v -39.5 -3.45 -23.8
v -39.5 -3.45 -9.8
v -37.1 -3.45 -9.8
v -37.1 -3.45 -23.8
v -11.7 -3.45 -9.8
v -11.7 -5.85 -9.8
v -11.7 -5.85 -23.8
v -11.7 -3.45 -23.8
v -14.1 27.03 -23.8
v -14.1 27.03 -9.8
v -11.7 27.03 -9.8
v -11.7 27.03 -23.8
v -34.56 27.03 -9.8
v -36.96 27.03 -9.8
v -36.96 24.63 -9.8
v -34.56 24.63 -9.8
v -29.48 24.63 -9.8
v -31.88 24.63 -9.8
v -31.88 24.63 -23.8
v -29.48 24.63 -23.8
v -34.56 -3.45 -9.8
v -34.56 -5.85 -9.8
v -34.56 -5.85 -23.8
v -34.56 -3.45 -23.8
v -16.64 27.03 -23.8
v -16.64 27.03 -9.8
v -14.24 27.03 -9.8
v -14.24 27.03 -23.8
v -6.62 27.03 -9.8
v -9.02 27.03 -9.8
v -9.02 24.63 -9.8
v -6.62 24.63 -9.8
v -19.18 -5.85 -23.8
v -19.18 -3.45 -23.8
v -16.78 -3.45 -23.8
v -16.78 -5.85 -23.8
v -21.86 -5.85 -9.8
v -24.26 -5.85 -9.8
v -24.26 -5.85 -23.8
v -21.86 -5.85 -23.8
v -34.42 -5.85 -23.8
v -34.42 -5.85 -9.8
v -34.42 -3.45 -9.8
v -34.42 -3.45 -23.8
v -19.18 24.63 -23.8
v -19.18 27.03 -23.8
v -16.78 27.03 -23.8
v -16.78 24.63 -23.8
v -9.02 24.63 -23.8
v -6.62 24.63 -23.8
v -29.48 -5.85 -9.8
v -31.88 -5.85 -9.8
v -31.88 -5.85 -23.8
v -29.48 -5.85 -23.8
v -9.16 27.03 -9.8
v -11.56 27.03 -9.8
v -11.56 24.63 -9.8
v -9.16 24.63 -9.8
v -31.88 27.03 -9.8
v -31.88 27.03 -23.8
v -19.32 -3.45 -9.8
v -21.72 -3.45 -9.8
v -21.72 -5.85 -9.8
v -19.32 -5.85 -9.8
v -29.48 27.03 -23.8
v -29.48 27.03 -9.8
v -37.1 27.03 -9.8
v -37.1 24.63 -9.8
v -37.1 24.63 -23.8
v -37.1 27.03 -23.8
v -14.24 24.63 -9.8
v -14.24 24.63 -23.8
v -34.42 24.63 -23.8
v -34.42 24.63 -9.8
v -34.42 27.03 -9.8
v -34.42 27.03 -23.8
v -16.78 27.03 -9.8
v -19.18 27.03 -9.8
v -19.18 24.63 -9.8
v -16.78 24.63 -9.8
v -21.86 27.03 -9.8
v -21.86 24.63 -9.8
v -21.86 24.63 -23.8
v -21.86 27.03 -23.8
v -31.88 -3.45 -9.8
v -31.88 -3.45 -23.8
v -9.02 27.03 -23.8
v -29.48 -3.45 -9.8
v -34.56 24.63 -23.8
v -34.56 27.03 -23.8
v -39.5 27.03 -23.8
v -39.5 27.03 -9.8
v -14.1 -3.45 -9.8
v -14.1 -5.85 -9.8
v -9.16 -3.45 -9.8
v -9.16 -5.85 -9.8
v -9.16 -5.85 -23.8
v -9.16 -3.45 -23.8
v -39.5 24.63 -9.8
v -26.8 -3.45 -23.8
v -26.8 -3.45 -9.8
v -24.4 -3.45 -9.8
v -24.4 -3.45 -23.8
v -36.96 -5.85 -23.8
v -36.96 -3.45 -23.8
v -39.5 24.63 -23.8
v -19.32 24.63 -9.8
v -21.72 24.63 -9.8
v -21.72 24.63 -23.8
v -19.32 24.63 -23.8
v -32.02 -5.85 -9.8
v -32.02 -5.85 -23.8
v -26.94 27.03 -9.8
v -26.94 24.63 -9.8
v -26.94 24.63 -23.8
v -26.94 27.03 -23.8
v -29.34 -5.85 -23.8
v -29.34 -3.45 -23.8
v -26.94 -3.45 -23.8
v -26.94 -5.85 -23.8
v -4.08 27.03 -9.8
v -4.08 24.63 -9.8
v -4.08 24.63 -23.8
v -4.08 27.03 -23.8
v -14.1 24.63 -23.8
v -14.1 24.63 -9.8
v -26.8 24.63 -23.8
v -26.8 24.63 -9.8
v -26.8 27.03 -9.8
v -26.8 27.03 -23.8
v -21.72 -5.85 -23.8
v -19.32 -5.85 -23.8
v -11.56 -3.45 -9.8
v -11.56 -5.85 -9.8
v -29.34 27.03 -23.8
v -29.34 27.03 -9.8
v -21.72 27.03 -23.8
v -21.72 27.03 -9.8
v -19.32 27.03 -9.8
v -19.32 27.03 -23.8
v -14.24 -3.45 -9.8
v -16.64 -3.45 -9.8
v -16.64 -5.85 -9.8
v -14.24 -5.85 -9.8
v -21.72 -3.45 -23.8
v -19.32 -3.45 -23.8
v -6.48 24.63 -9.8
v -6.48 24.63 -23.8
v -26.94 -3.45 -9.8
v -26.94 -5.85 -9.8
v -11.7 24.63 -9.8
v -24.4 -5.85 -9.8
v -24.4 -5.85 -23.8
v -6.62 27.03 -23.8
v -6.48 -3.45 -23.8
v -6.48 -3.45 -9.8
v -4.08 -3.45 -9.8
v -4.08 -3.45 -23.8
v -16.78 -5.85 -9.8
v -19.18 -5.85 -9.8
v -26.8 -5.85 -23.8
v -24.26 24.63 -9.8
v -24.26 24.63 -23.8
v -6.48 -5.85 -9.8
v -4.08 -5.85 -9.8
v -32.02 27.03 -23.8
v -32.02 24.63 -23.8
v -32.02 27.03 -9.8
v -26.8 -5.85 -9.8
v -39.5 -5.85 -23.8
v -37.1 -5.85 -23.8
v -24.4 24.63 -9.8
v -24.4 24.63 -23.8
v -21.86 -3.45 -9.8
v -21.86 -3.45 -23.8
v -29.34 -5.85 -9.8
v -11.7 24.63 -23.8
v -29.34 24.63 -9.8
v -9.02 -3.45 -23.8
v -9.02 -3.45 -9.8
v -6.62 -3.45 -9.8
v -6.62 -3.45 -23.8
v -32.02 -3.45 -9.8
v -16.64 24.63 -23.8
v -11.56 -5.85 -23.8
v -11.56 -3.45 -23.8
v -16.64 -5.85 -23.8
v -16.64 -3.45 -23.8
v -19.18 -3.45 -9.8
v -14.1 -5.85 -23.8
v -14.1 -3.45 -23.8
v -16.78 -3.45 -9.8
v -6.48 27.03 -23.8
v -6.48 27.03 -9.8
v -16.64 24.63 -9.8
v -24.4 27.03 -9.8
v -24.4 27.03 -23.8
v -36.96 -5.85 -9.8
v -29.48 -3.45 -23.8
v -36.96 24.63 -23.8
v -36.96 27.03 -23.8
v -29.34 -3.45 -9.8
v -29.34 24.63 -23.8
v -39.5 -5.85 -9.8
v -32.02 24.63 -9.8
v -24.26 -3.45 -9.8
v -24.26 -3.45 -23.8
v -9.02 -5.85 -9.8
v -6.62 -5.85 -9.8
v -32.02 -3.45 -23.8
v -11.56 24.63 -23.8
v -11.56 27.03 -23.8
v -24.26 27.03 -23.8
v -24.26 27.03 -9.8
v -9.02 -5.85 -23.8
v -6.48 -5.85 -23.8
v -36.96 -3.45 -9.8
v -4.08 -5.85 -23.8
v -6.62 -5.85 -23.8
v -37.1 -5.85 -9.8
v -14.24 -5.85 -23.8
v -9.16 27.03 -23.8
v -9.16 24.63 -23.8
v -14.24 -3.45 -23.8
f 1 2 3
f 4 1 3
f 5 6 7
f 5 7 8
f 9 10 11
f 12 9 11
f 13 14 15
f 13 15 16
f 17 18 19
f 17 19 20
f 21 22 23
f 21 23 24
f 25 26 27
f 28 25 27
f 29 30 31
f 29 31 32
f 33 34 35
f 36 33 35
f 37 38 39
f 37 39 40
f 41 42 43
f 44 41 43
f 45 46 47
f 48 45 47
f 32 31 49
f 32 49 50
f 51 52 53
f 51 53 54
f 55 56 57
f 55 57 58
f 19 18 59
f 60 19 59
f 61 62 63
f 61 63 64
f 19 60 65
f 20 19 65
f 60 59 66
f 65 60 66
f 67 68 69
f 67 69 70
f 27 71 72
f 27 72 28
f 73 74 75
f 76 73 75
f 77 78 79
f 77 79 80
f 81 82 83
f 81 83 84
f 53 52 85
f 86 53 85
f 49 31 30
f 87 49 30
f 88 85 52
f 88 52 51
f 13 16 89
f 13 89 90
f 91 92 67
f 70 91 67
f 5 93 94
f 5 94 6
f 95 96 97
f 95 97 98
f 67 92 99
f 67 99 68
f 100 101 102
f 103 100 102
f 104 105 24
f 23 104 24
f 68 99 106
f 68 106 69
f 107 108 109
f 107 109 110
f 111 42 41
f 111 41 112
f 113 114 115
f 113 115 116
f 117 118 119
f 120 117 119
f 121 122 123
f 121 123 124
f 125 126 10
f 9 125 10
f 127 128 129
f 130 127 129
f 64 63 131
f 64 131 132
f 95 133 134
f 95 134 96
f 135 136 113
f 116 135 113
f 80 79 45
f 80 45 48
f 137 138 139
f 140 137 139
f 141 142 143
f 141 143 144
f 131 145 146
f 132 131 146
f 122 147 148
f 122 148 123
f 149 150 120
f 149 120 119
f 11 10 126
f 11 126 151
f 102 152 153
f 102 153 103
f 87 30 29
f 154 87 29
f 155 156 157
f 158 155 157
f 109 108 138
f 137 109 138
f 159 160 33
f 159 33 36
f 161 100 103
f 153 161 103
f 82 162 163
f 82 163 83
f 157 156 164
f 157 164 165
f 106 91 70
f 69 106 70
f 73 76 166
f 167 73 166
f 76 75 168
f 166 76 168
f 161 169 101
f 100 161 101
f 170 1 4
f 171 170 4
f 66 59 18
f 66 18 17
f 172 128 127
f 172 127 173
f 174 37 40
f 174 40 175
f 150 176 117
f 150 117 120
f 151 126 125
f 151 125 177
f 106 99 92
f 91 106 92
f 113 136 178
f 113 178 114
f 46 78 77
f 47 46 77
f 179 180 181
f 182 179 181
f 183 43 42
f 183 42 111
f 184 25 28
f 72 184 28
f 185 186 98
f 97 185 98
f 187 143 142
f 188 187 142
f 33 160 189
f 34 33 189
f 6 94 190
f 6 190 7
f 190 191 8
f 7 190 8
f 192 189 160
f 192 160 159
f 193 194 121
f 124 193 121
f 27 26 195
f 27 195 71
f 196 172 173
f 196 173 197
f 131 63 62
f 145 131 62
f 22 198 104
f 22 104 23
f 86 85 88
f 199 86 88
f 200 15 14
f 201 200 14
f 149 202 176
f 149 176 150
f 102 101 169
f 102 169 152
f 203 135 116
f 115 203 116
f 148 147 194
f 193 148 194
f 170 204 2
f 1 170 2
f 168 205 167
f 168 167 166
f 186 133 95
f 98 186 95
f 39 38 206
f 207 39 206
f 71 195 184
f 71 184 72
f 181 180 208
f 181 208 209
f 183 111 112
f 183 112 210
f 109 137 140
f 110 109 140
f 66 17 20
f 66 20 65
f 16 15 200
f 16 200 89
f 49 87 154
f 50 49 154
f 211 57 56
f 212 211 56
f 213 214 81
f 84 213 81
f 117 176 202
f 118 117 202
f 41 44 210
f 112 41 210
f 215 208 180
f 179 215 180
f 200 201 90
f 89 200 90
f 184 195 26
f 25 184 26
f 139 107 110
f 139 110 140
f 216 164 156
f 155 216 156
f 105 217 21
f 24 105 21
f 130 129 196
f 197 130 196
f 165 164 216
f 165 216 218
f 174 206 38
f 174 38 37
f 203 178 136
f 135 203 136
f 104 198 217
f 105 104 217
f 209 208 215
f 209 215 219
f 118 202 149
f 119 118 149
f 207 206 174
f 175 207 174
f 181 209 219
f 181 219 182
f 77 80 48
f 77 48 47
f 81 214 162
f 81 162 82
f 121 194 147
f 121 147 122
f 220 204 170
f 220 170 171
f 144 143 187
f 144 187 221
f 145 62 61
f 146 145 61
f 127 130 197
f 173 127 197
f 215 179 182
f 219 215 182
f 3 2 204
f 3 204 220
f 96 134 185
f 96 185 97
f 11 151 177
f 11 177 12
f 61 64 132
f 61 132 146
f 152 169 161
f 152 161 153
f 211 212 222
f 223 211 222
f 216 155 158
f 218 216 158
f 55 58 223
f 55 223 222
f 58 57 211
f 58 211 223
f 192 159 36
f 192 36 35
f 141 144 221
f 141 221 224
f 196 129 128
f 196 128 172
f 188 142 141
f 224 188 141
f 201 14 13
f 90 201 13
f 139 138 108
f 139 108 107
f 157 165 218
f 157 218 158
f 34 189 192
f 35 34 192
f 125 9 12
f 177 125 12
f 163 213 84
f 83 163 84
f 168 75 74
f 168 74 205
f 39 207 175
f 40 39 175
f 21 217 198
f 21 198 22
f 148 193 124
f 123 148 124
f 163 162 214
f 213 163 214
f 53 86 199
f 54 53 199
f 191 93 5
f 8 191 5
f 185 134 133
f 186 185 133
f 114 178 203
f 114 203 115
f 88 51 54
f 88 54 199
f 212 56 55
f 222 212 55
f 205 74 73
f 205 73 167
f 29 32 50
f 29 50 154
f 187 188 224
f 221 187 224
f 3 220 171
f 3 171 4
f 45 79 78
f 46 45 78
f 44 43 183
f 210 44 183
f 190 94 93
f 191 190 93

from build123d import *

# Parameters (mm, degrees)
HOUSINGS_SK1_W    = 2.4
HOUSINGS_SK1_H    = 2.4
HOUSINGS_DEPTH    = 14
HOUSINGS_2_DEPTH  = 14
HOUSINGS_3_DEPTH  = 14
HOUSINGS_4_DEPTH  = 14
HOUSINGS_5_DEPTH  = 14
HOUSINGS_6_DEPTH  = 14
HOUSINGS_7_DEPTH  = 14
HOUSINGS_8_DEPTH  = 14
HOUSINGS_9_DEPTH  = 14
HOUSINGS_10_DEPTH = 14
HOUSINGS_11_DEPTH = 14
HOUSINGS_12_DEPTH = 14
HOUSINGS_13_DEPTH = 14
HOUSINGS_14_DEPTH = 14
HOUSINGS_15_DEPTH = 14
HOUSINGS_16_DEPTH = 14
HOUSINGS_17_DEPTH = 14
HOUSINGS_18_DEPTH = 14
HOUSINGS_19_DEPTH = 14
HOUSINGS_20_DEPTH = 14
HOUSINGS_21_DEPTH = 14
HOUSINGS_22_DEPTH = 14
HOUSINGS_23_DEPTH = 14
HOUSINGS_24_DEPTH = 14
HOUSINGS_25_DEPTH = 14
HOUSINGS_26_DEPTH = 14
HOUSINGS_27_DEPTH = 14
HOUSINGS_28_DEPTH = 14


with BuildPart() as part:
    # Housings_Sk1 → Housings (new body)
    with BuildSketch(Plane.XY.offset(-9.8)):
        with Locations((-38.3, -4.65)):
            Rectangle(HOUSINGS_SK1_W, HOUSINGS_SK1_H)
    extrude(amount=-HOUSINGS_DEPTH)


with BuildPart() as body_2:
    # Housings_Sk1 → Housings 2 (new body)
    with BuildSketch(Plane.XY.offset(-9.8)):
        with Locations((-35.76, -4.65)):
            Rectangle(HOUSINGS_SK1_W, HOUSINGS_SK1_H)
    extrude(amount=-HOUSINGS_2_DEPTH)


with BuildPart() as body_3:
    # Housings_Sk1 → Housings 3 (new body)
    with BuildSketch(Plane.XY.offset(-9.8)):
        with Locations((-33.22, -4.65)):
            Rectangle(HOUSINGS_SK1_W, HOUSINGS_SK1_H)
    extrude(amount=-HOUSINGS_3_DEPTH)


with BuildPart() as body_4:
    # Housings_Sk1 → Housings 4 (new body)
    with BuildSketch(Plane.XY.offset(-9.8)):
        with Locations((-30.68, -4.65)):
            Rectangle(HOUSINGS_SK1_W, HOUSINGS_SK1_H)
    extrude(amount=-HOUSINGS_4_DEPTH)


with BuildPart() as body_5:
    # Housings_Sk1 → Housings 5 (new body)
    with BuildSketch(Plane.XY.offset(-9.8)):
        with Locations((-28.14, -4.65)):
            Rectangle(HOUSINGS_SK1_W, HOUSINGS_SK1_H)
    extrude(amount=-HOUSINGS_5_DEPTH)


with BuildPart() as body_6:
    # Housings_Sk1 → Housings 6 (new body)
    with BuildSketch(Plane.XY.offset(-9.8)):
        with Locations((-25.6, -4.65)):
            Rectangle(HOUSINGS_SK1_W, HOUSINGS_SK1_H)
    extrude(amount=-HOUSINGS_6_DEPTH)


with BuildPart() as body_7:
    # Housings_Sk1 → Housings 7 (new body)
    with BuildSketch(Plane.XY.offset(-9.8)):
        with Locations((-23.06, -4.65)):
            Rectangle(HOUSINGS_SK1_W, HOUSINGS_SK1_H)
    extrude(amount=-HOUSINGS_7_DEPTH)


with BuildPart() as body_8:
    # Housings_Sk1 → Housings 8 (new body)
    with BuildSketch(Plane.XY.offset(-9.8)):
        with Locations((-20.52, -4.65)):
            Rectangle(HOUSINGS_SK1_W, HOUSINGS_SK1_H)
    extrude(amount=-HOUSINGS_8_DEPTH)


with BuildPart() as body_9:
    # Housings_Sk1 → Housings 9 (new body)
    with BuildSketch(Plane.XY.offset(-9.8)):
        with Locations((-17.98, -4.65)):
            Rectangle(HOUSINGS_SK1_W, HOUSINGS_SK1_H)
    extrude(amount=-HOUSINGS_9_DEPTH)


with BuildPart() as body_10:
    # Housings_Sk1 → Housings 10 (new body)
    with BuildSketch(Plane.XY.offset(-9.8)):
        with Locations((-15.44, -4.65)):
            Rectangle(HOUSINGS_SK1_W, HOUSINGS_SK1_H)
    extrude(amount=-HOUSINGS_10_DEPTH)


with BuildPart() as body_11:
    # Housings_Sk1 → Housings 11 (new body)
    with BuildSketch(Plane.XY.offset(-9.8)):
        with Locations((-12.9, -4.65)):
            Rectangle(HOUSINGS_SK1_W, HOUSINGS_SK1_H)
    extrude(amount=-HOUSINGS_11_DEPTH)


with BuildPart() as body_12:
    # Housings_Sk1 → Housings 12 (new body)
    with BuildSketch(Plane.XY.offset(-9.8)):
        with Locations((-10.36, -4.65)):
            Rectangle(HOUSINGS_SK1_W, HOUSINGS_SK1_H)
    extrude(amount=-HOUSINGS_12_DEPTH)


with BuildPart() as body_13:
    # Housings_Sk1 → Housings 13 (new body)
    with BuildSketch(Plane.XY.offset(-9.8)):
        with Locations((-7.82, -4.65)):
            Rectangle(HOUSINGS_SK1_W, HOUSINGS_SK1_H)
    extrude(amount=-HOUSINGS_13_DEPTH)


with BuildPart() as body_14:
    # Housings_Sk1 → Housings 14 (new body)
    with BuildSketch(Plane.XY.offset(-9.8)):
        with Locations((-5.28, -4.65)):
            Rectangle(HOUSINGS_SK1_W, HOUSINGS_SK1_H)
    extrude(amount=-HOUSINGS_14_DEPTH)


with BuildPart() as body_15:
    # Housings_Sk1 → Housings 15 (new body)
    with BuildSketch(Plane.XY.offset(-9.8)):
        with Locations((-38.3, 25.83)):
            Rectangle(HOUSINGS_SK1_W, HOUSINGS_SK1_H)
    extrude(amount=-HOUSINGS_15_DEPTH)


with BuildPart() as body_16:
    # Housings_Sk1 → Housings 16 (new body)
    with BuildSketch(Plane.XY.offset(-9.8)):
        with Locations((-35.76, 25.83)):
            Rectangle(HOUSINGS_SK1_W, HOUSINGS_SK1_H)
    extrude(amount=-HOUSINGS_16_DEPTH)


with BuildPart() as body_17:
    # Housings_Sk1 → Housings 17 (new body)
    with BuildSketch(Plane.XY.offset(-9.8)):
        with Locations((-33.22, 25.83)):
            Rectangle(HOUSINGS_SK1_W, HOUSINGS_SK1_H)
    extrude(amount=-HOUSINGS_17_DEPTH)


with BuildPart() as body_18:
    # Housings_Sk1 → Housings 18 (new body)
    with BuildSketch(Plane.XY.offset(-9.8)):
        with Locations((-30.68, 25.83)):
            Rectangle(HOUSINGS_SK1_W, HOUSINGS_SK1_H)
    extrude(amount=-HOUSINGS_18_DEPTH)


with BuildPart() as body_19:
    # Housings_Sk1 → Housings 19 (new body)
    with BuildSketch(Plane.XY.offset(-9.8)):
        with Locations((-28.14, 25.83)):
            Rectangle(HOUSINGS_SK1_W, HOUSINGS_SK1_H)
    extrude(amount=-HOUSINGS_19_DEPTH)


with BuildPart() as body_20:
    # Housings_Sk1 → Housings 20 (new body)
    with BuildSketch(Plane.XY.offset(-9.8)):
        with Locations((-25.6, 25.83)):
            Rectangle(HOUSINGS_SK1_W, HOUSINGS_SK1_H)
    extrude(amount=-HOUSINGS_20_DEPTH)


with BuildPart() as body_21:
    # Housings_Sk1 → Housings 21 (new body)
    with BuildSketch(Plane.XY.offset(-9.8)):
        with Locations((-23.06, 25.83)):
            Rectangle(HOUSINGS_SK1_W, HOUSINGS_SK1_H)
    extrude(amount=-HOUSINGS_21_DEPTH)


with BuildPart() as body_22:
    # Housings_Sk1 → Housings 22 (new body)
    with BuildSketch(Plane.XY.offset(-9.8)):
        with Locations((-20.52, 25.83)):
            Rectangle(HOUSINGS_SK1_W, HOUSINGS_SK1_H)
    extrude(amount=-HOUSINGS_22_DEPTH)


with BuildPart() as body_23:
    # Housings_Sk1 → Housings 23 (new body)
    with BuildSketch(Plane.XY.offset(-9.8)):
        with Locations((-17.98, 25.83)):
            Rectangle(HOUSINGS_SK1_W, HOUSINGS_SK1_H)
    extrude(amount=-HOUSINGS_23_DEPTH)


with BuildPart() as body_24:
    # Housings_Sk1 → Housings 24 (new body)
    with BuildSketch(Plane.XY.offset(-9.8)):
        with Locations((-15.44, 25.83)):
            Rectangle(HOUSINGS_SK1_W, HOUSINGS_SK1_H)
    extrude(amount=-HOUSINGS_24_DEPTH)


with BuildPart() as body_25:
    # Housings_Sk1 → Housings 25 (new body)
    with BuildSketch(Plane.XY.offset(-9.8)):
        with Locations((-12.9, 25.83)):
            Rectangle(HOUSINGS_SK1_W, HOUSINGS_SK1_H)
    extrude(amount=-HOUSINGS_25_DEPTH)


with BuildPart() as body_26:
    # Housings_Sk1 → Housings 26 (new body)
    with BuildSketch(Plane.XY.offset(-9.8)):
        with Locations((-10.36, 25.83)):
            Rectangle(HOUSINGS_SK1_W, HOUSINGS_SK1_H)
    extrude(amount=-HOUSINGS_26_DEPTH)


with BuildPart() as body_27:
    # Housings_Sk1 → Housings 27 (new body)
    with BuildSketch(Plane.XY.offset(-9.8)):
        with Locations((-7.82, 25.83)):
            Rectangle(HOUSINGS_SK1_W, HOUSINGS_SK1_H)
    extrude(amount=-HOUSINGS_27_DEPTH)


with BuildPart() as body_28:
    # Housings_Sk1 → Housings 28 (new body)
    with BuildSketch(Plane.XY.offset(-9.8)):
        with Locations((-5.28, 25.83)):
            Rectangle(HOUSINGS_SK1_W, HOUSINGS_SK1_H)
    extrude(amount=-HOUSINGS_28_DEPTH)


solid = Compound([part.part, body_2.part, body_3.part, body_4.part, body_5.part, body_6.part, body_7.part, body_8.part, body_9.part, body_10.part, body_11.part, body_12.part, body_13.part, body_14.part, body_15.part, body_16.part, body_17.part, body_18.part, body_19.part, body_20.part, body_21.part, body_22.part, body_23.part, body_24.part, body_25.part, body_26.part, body_27.part, body_28.part])
